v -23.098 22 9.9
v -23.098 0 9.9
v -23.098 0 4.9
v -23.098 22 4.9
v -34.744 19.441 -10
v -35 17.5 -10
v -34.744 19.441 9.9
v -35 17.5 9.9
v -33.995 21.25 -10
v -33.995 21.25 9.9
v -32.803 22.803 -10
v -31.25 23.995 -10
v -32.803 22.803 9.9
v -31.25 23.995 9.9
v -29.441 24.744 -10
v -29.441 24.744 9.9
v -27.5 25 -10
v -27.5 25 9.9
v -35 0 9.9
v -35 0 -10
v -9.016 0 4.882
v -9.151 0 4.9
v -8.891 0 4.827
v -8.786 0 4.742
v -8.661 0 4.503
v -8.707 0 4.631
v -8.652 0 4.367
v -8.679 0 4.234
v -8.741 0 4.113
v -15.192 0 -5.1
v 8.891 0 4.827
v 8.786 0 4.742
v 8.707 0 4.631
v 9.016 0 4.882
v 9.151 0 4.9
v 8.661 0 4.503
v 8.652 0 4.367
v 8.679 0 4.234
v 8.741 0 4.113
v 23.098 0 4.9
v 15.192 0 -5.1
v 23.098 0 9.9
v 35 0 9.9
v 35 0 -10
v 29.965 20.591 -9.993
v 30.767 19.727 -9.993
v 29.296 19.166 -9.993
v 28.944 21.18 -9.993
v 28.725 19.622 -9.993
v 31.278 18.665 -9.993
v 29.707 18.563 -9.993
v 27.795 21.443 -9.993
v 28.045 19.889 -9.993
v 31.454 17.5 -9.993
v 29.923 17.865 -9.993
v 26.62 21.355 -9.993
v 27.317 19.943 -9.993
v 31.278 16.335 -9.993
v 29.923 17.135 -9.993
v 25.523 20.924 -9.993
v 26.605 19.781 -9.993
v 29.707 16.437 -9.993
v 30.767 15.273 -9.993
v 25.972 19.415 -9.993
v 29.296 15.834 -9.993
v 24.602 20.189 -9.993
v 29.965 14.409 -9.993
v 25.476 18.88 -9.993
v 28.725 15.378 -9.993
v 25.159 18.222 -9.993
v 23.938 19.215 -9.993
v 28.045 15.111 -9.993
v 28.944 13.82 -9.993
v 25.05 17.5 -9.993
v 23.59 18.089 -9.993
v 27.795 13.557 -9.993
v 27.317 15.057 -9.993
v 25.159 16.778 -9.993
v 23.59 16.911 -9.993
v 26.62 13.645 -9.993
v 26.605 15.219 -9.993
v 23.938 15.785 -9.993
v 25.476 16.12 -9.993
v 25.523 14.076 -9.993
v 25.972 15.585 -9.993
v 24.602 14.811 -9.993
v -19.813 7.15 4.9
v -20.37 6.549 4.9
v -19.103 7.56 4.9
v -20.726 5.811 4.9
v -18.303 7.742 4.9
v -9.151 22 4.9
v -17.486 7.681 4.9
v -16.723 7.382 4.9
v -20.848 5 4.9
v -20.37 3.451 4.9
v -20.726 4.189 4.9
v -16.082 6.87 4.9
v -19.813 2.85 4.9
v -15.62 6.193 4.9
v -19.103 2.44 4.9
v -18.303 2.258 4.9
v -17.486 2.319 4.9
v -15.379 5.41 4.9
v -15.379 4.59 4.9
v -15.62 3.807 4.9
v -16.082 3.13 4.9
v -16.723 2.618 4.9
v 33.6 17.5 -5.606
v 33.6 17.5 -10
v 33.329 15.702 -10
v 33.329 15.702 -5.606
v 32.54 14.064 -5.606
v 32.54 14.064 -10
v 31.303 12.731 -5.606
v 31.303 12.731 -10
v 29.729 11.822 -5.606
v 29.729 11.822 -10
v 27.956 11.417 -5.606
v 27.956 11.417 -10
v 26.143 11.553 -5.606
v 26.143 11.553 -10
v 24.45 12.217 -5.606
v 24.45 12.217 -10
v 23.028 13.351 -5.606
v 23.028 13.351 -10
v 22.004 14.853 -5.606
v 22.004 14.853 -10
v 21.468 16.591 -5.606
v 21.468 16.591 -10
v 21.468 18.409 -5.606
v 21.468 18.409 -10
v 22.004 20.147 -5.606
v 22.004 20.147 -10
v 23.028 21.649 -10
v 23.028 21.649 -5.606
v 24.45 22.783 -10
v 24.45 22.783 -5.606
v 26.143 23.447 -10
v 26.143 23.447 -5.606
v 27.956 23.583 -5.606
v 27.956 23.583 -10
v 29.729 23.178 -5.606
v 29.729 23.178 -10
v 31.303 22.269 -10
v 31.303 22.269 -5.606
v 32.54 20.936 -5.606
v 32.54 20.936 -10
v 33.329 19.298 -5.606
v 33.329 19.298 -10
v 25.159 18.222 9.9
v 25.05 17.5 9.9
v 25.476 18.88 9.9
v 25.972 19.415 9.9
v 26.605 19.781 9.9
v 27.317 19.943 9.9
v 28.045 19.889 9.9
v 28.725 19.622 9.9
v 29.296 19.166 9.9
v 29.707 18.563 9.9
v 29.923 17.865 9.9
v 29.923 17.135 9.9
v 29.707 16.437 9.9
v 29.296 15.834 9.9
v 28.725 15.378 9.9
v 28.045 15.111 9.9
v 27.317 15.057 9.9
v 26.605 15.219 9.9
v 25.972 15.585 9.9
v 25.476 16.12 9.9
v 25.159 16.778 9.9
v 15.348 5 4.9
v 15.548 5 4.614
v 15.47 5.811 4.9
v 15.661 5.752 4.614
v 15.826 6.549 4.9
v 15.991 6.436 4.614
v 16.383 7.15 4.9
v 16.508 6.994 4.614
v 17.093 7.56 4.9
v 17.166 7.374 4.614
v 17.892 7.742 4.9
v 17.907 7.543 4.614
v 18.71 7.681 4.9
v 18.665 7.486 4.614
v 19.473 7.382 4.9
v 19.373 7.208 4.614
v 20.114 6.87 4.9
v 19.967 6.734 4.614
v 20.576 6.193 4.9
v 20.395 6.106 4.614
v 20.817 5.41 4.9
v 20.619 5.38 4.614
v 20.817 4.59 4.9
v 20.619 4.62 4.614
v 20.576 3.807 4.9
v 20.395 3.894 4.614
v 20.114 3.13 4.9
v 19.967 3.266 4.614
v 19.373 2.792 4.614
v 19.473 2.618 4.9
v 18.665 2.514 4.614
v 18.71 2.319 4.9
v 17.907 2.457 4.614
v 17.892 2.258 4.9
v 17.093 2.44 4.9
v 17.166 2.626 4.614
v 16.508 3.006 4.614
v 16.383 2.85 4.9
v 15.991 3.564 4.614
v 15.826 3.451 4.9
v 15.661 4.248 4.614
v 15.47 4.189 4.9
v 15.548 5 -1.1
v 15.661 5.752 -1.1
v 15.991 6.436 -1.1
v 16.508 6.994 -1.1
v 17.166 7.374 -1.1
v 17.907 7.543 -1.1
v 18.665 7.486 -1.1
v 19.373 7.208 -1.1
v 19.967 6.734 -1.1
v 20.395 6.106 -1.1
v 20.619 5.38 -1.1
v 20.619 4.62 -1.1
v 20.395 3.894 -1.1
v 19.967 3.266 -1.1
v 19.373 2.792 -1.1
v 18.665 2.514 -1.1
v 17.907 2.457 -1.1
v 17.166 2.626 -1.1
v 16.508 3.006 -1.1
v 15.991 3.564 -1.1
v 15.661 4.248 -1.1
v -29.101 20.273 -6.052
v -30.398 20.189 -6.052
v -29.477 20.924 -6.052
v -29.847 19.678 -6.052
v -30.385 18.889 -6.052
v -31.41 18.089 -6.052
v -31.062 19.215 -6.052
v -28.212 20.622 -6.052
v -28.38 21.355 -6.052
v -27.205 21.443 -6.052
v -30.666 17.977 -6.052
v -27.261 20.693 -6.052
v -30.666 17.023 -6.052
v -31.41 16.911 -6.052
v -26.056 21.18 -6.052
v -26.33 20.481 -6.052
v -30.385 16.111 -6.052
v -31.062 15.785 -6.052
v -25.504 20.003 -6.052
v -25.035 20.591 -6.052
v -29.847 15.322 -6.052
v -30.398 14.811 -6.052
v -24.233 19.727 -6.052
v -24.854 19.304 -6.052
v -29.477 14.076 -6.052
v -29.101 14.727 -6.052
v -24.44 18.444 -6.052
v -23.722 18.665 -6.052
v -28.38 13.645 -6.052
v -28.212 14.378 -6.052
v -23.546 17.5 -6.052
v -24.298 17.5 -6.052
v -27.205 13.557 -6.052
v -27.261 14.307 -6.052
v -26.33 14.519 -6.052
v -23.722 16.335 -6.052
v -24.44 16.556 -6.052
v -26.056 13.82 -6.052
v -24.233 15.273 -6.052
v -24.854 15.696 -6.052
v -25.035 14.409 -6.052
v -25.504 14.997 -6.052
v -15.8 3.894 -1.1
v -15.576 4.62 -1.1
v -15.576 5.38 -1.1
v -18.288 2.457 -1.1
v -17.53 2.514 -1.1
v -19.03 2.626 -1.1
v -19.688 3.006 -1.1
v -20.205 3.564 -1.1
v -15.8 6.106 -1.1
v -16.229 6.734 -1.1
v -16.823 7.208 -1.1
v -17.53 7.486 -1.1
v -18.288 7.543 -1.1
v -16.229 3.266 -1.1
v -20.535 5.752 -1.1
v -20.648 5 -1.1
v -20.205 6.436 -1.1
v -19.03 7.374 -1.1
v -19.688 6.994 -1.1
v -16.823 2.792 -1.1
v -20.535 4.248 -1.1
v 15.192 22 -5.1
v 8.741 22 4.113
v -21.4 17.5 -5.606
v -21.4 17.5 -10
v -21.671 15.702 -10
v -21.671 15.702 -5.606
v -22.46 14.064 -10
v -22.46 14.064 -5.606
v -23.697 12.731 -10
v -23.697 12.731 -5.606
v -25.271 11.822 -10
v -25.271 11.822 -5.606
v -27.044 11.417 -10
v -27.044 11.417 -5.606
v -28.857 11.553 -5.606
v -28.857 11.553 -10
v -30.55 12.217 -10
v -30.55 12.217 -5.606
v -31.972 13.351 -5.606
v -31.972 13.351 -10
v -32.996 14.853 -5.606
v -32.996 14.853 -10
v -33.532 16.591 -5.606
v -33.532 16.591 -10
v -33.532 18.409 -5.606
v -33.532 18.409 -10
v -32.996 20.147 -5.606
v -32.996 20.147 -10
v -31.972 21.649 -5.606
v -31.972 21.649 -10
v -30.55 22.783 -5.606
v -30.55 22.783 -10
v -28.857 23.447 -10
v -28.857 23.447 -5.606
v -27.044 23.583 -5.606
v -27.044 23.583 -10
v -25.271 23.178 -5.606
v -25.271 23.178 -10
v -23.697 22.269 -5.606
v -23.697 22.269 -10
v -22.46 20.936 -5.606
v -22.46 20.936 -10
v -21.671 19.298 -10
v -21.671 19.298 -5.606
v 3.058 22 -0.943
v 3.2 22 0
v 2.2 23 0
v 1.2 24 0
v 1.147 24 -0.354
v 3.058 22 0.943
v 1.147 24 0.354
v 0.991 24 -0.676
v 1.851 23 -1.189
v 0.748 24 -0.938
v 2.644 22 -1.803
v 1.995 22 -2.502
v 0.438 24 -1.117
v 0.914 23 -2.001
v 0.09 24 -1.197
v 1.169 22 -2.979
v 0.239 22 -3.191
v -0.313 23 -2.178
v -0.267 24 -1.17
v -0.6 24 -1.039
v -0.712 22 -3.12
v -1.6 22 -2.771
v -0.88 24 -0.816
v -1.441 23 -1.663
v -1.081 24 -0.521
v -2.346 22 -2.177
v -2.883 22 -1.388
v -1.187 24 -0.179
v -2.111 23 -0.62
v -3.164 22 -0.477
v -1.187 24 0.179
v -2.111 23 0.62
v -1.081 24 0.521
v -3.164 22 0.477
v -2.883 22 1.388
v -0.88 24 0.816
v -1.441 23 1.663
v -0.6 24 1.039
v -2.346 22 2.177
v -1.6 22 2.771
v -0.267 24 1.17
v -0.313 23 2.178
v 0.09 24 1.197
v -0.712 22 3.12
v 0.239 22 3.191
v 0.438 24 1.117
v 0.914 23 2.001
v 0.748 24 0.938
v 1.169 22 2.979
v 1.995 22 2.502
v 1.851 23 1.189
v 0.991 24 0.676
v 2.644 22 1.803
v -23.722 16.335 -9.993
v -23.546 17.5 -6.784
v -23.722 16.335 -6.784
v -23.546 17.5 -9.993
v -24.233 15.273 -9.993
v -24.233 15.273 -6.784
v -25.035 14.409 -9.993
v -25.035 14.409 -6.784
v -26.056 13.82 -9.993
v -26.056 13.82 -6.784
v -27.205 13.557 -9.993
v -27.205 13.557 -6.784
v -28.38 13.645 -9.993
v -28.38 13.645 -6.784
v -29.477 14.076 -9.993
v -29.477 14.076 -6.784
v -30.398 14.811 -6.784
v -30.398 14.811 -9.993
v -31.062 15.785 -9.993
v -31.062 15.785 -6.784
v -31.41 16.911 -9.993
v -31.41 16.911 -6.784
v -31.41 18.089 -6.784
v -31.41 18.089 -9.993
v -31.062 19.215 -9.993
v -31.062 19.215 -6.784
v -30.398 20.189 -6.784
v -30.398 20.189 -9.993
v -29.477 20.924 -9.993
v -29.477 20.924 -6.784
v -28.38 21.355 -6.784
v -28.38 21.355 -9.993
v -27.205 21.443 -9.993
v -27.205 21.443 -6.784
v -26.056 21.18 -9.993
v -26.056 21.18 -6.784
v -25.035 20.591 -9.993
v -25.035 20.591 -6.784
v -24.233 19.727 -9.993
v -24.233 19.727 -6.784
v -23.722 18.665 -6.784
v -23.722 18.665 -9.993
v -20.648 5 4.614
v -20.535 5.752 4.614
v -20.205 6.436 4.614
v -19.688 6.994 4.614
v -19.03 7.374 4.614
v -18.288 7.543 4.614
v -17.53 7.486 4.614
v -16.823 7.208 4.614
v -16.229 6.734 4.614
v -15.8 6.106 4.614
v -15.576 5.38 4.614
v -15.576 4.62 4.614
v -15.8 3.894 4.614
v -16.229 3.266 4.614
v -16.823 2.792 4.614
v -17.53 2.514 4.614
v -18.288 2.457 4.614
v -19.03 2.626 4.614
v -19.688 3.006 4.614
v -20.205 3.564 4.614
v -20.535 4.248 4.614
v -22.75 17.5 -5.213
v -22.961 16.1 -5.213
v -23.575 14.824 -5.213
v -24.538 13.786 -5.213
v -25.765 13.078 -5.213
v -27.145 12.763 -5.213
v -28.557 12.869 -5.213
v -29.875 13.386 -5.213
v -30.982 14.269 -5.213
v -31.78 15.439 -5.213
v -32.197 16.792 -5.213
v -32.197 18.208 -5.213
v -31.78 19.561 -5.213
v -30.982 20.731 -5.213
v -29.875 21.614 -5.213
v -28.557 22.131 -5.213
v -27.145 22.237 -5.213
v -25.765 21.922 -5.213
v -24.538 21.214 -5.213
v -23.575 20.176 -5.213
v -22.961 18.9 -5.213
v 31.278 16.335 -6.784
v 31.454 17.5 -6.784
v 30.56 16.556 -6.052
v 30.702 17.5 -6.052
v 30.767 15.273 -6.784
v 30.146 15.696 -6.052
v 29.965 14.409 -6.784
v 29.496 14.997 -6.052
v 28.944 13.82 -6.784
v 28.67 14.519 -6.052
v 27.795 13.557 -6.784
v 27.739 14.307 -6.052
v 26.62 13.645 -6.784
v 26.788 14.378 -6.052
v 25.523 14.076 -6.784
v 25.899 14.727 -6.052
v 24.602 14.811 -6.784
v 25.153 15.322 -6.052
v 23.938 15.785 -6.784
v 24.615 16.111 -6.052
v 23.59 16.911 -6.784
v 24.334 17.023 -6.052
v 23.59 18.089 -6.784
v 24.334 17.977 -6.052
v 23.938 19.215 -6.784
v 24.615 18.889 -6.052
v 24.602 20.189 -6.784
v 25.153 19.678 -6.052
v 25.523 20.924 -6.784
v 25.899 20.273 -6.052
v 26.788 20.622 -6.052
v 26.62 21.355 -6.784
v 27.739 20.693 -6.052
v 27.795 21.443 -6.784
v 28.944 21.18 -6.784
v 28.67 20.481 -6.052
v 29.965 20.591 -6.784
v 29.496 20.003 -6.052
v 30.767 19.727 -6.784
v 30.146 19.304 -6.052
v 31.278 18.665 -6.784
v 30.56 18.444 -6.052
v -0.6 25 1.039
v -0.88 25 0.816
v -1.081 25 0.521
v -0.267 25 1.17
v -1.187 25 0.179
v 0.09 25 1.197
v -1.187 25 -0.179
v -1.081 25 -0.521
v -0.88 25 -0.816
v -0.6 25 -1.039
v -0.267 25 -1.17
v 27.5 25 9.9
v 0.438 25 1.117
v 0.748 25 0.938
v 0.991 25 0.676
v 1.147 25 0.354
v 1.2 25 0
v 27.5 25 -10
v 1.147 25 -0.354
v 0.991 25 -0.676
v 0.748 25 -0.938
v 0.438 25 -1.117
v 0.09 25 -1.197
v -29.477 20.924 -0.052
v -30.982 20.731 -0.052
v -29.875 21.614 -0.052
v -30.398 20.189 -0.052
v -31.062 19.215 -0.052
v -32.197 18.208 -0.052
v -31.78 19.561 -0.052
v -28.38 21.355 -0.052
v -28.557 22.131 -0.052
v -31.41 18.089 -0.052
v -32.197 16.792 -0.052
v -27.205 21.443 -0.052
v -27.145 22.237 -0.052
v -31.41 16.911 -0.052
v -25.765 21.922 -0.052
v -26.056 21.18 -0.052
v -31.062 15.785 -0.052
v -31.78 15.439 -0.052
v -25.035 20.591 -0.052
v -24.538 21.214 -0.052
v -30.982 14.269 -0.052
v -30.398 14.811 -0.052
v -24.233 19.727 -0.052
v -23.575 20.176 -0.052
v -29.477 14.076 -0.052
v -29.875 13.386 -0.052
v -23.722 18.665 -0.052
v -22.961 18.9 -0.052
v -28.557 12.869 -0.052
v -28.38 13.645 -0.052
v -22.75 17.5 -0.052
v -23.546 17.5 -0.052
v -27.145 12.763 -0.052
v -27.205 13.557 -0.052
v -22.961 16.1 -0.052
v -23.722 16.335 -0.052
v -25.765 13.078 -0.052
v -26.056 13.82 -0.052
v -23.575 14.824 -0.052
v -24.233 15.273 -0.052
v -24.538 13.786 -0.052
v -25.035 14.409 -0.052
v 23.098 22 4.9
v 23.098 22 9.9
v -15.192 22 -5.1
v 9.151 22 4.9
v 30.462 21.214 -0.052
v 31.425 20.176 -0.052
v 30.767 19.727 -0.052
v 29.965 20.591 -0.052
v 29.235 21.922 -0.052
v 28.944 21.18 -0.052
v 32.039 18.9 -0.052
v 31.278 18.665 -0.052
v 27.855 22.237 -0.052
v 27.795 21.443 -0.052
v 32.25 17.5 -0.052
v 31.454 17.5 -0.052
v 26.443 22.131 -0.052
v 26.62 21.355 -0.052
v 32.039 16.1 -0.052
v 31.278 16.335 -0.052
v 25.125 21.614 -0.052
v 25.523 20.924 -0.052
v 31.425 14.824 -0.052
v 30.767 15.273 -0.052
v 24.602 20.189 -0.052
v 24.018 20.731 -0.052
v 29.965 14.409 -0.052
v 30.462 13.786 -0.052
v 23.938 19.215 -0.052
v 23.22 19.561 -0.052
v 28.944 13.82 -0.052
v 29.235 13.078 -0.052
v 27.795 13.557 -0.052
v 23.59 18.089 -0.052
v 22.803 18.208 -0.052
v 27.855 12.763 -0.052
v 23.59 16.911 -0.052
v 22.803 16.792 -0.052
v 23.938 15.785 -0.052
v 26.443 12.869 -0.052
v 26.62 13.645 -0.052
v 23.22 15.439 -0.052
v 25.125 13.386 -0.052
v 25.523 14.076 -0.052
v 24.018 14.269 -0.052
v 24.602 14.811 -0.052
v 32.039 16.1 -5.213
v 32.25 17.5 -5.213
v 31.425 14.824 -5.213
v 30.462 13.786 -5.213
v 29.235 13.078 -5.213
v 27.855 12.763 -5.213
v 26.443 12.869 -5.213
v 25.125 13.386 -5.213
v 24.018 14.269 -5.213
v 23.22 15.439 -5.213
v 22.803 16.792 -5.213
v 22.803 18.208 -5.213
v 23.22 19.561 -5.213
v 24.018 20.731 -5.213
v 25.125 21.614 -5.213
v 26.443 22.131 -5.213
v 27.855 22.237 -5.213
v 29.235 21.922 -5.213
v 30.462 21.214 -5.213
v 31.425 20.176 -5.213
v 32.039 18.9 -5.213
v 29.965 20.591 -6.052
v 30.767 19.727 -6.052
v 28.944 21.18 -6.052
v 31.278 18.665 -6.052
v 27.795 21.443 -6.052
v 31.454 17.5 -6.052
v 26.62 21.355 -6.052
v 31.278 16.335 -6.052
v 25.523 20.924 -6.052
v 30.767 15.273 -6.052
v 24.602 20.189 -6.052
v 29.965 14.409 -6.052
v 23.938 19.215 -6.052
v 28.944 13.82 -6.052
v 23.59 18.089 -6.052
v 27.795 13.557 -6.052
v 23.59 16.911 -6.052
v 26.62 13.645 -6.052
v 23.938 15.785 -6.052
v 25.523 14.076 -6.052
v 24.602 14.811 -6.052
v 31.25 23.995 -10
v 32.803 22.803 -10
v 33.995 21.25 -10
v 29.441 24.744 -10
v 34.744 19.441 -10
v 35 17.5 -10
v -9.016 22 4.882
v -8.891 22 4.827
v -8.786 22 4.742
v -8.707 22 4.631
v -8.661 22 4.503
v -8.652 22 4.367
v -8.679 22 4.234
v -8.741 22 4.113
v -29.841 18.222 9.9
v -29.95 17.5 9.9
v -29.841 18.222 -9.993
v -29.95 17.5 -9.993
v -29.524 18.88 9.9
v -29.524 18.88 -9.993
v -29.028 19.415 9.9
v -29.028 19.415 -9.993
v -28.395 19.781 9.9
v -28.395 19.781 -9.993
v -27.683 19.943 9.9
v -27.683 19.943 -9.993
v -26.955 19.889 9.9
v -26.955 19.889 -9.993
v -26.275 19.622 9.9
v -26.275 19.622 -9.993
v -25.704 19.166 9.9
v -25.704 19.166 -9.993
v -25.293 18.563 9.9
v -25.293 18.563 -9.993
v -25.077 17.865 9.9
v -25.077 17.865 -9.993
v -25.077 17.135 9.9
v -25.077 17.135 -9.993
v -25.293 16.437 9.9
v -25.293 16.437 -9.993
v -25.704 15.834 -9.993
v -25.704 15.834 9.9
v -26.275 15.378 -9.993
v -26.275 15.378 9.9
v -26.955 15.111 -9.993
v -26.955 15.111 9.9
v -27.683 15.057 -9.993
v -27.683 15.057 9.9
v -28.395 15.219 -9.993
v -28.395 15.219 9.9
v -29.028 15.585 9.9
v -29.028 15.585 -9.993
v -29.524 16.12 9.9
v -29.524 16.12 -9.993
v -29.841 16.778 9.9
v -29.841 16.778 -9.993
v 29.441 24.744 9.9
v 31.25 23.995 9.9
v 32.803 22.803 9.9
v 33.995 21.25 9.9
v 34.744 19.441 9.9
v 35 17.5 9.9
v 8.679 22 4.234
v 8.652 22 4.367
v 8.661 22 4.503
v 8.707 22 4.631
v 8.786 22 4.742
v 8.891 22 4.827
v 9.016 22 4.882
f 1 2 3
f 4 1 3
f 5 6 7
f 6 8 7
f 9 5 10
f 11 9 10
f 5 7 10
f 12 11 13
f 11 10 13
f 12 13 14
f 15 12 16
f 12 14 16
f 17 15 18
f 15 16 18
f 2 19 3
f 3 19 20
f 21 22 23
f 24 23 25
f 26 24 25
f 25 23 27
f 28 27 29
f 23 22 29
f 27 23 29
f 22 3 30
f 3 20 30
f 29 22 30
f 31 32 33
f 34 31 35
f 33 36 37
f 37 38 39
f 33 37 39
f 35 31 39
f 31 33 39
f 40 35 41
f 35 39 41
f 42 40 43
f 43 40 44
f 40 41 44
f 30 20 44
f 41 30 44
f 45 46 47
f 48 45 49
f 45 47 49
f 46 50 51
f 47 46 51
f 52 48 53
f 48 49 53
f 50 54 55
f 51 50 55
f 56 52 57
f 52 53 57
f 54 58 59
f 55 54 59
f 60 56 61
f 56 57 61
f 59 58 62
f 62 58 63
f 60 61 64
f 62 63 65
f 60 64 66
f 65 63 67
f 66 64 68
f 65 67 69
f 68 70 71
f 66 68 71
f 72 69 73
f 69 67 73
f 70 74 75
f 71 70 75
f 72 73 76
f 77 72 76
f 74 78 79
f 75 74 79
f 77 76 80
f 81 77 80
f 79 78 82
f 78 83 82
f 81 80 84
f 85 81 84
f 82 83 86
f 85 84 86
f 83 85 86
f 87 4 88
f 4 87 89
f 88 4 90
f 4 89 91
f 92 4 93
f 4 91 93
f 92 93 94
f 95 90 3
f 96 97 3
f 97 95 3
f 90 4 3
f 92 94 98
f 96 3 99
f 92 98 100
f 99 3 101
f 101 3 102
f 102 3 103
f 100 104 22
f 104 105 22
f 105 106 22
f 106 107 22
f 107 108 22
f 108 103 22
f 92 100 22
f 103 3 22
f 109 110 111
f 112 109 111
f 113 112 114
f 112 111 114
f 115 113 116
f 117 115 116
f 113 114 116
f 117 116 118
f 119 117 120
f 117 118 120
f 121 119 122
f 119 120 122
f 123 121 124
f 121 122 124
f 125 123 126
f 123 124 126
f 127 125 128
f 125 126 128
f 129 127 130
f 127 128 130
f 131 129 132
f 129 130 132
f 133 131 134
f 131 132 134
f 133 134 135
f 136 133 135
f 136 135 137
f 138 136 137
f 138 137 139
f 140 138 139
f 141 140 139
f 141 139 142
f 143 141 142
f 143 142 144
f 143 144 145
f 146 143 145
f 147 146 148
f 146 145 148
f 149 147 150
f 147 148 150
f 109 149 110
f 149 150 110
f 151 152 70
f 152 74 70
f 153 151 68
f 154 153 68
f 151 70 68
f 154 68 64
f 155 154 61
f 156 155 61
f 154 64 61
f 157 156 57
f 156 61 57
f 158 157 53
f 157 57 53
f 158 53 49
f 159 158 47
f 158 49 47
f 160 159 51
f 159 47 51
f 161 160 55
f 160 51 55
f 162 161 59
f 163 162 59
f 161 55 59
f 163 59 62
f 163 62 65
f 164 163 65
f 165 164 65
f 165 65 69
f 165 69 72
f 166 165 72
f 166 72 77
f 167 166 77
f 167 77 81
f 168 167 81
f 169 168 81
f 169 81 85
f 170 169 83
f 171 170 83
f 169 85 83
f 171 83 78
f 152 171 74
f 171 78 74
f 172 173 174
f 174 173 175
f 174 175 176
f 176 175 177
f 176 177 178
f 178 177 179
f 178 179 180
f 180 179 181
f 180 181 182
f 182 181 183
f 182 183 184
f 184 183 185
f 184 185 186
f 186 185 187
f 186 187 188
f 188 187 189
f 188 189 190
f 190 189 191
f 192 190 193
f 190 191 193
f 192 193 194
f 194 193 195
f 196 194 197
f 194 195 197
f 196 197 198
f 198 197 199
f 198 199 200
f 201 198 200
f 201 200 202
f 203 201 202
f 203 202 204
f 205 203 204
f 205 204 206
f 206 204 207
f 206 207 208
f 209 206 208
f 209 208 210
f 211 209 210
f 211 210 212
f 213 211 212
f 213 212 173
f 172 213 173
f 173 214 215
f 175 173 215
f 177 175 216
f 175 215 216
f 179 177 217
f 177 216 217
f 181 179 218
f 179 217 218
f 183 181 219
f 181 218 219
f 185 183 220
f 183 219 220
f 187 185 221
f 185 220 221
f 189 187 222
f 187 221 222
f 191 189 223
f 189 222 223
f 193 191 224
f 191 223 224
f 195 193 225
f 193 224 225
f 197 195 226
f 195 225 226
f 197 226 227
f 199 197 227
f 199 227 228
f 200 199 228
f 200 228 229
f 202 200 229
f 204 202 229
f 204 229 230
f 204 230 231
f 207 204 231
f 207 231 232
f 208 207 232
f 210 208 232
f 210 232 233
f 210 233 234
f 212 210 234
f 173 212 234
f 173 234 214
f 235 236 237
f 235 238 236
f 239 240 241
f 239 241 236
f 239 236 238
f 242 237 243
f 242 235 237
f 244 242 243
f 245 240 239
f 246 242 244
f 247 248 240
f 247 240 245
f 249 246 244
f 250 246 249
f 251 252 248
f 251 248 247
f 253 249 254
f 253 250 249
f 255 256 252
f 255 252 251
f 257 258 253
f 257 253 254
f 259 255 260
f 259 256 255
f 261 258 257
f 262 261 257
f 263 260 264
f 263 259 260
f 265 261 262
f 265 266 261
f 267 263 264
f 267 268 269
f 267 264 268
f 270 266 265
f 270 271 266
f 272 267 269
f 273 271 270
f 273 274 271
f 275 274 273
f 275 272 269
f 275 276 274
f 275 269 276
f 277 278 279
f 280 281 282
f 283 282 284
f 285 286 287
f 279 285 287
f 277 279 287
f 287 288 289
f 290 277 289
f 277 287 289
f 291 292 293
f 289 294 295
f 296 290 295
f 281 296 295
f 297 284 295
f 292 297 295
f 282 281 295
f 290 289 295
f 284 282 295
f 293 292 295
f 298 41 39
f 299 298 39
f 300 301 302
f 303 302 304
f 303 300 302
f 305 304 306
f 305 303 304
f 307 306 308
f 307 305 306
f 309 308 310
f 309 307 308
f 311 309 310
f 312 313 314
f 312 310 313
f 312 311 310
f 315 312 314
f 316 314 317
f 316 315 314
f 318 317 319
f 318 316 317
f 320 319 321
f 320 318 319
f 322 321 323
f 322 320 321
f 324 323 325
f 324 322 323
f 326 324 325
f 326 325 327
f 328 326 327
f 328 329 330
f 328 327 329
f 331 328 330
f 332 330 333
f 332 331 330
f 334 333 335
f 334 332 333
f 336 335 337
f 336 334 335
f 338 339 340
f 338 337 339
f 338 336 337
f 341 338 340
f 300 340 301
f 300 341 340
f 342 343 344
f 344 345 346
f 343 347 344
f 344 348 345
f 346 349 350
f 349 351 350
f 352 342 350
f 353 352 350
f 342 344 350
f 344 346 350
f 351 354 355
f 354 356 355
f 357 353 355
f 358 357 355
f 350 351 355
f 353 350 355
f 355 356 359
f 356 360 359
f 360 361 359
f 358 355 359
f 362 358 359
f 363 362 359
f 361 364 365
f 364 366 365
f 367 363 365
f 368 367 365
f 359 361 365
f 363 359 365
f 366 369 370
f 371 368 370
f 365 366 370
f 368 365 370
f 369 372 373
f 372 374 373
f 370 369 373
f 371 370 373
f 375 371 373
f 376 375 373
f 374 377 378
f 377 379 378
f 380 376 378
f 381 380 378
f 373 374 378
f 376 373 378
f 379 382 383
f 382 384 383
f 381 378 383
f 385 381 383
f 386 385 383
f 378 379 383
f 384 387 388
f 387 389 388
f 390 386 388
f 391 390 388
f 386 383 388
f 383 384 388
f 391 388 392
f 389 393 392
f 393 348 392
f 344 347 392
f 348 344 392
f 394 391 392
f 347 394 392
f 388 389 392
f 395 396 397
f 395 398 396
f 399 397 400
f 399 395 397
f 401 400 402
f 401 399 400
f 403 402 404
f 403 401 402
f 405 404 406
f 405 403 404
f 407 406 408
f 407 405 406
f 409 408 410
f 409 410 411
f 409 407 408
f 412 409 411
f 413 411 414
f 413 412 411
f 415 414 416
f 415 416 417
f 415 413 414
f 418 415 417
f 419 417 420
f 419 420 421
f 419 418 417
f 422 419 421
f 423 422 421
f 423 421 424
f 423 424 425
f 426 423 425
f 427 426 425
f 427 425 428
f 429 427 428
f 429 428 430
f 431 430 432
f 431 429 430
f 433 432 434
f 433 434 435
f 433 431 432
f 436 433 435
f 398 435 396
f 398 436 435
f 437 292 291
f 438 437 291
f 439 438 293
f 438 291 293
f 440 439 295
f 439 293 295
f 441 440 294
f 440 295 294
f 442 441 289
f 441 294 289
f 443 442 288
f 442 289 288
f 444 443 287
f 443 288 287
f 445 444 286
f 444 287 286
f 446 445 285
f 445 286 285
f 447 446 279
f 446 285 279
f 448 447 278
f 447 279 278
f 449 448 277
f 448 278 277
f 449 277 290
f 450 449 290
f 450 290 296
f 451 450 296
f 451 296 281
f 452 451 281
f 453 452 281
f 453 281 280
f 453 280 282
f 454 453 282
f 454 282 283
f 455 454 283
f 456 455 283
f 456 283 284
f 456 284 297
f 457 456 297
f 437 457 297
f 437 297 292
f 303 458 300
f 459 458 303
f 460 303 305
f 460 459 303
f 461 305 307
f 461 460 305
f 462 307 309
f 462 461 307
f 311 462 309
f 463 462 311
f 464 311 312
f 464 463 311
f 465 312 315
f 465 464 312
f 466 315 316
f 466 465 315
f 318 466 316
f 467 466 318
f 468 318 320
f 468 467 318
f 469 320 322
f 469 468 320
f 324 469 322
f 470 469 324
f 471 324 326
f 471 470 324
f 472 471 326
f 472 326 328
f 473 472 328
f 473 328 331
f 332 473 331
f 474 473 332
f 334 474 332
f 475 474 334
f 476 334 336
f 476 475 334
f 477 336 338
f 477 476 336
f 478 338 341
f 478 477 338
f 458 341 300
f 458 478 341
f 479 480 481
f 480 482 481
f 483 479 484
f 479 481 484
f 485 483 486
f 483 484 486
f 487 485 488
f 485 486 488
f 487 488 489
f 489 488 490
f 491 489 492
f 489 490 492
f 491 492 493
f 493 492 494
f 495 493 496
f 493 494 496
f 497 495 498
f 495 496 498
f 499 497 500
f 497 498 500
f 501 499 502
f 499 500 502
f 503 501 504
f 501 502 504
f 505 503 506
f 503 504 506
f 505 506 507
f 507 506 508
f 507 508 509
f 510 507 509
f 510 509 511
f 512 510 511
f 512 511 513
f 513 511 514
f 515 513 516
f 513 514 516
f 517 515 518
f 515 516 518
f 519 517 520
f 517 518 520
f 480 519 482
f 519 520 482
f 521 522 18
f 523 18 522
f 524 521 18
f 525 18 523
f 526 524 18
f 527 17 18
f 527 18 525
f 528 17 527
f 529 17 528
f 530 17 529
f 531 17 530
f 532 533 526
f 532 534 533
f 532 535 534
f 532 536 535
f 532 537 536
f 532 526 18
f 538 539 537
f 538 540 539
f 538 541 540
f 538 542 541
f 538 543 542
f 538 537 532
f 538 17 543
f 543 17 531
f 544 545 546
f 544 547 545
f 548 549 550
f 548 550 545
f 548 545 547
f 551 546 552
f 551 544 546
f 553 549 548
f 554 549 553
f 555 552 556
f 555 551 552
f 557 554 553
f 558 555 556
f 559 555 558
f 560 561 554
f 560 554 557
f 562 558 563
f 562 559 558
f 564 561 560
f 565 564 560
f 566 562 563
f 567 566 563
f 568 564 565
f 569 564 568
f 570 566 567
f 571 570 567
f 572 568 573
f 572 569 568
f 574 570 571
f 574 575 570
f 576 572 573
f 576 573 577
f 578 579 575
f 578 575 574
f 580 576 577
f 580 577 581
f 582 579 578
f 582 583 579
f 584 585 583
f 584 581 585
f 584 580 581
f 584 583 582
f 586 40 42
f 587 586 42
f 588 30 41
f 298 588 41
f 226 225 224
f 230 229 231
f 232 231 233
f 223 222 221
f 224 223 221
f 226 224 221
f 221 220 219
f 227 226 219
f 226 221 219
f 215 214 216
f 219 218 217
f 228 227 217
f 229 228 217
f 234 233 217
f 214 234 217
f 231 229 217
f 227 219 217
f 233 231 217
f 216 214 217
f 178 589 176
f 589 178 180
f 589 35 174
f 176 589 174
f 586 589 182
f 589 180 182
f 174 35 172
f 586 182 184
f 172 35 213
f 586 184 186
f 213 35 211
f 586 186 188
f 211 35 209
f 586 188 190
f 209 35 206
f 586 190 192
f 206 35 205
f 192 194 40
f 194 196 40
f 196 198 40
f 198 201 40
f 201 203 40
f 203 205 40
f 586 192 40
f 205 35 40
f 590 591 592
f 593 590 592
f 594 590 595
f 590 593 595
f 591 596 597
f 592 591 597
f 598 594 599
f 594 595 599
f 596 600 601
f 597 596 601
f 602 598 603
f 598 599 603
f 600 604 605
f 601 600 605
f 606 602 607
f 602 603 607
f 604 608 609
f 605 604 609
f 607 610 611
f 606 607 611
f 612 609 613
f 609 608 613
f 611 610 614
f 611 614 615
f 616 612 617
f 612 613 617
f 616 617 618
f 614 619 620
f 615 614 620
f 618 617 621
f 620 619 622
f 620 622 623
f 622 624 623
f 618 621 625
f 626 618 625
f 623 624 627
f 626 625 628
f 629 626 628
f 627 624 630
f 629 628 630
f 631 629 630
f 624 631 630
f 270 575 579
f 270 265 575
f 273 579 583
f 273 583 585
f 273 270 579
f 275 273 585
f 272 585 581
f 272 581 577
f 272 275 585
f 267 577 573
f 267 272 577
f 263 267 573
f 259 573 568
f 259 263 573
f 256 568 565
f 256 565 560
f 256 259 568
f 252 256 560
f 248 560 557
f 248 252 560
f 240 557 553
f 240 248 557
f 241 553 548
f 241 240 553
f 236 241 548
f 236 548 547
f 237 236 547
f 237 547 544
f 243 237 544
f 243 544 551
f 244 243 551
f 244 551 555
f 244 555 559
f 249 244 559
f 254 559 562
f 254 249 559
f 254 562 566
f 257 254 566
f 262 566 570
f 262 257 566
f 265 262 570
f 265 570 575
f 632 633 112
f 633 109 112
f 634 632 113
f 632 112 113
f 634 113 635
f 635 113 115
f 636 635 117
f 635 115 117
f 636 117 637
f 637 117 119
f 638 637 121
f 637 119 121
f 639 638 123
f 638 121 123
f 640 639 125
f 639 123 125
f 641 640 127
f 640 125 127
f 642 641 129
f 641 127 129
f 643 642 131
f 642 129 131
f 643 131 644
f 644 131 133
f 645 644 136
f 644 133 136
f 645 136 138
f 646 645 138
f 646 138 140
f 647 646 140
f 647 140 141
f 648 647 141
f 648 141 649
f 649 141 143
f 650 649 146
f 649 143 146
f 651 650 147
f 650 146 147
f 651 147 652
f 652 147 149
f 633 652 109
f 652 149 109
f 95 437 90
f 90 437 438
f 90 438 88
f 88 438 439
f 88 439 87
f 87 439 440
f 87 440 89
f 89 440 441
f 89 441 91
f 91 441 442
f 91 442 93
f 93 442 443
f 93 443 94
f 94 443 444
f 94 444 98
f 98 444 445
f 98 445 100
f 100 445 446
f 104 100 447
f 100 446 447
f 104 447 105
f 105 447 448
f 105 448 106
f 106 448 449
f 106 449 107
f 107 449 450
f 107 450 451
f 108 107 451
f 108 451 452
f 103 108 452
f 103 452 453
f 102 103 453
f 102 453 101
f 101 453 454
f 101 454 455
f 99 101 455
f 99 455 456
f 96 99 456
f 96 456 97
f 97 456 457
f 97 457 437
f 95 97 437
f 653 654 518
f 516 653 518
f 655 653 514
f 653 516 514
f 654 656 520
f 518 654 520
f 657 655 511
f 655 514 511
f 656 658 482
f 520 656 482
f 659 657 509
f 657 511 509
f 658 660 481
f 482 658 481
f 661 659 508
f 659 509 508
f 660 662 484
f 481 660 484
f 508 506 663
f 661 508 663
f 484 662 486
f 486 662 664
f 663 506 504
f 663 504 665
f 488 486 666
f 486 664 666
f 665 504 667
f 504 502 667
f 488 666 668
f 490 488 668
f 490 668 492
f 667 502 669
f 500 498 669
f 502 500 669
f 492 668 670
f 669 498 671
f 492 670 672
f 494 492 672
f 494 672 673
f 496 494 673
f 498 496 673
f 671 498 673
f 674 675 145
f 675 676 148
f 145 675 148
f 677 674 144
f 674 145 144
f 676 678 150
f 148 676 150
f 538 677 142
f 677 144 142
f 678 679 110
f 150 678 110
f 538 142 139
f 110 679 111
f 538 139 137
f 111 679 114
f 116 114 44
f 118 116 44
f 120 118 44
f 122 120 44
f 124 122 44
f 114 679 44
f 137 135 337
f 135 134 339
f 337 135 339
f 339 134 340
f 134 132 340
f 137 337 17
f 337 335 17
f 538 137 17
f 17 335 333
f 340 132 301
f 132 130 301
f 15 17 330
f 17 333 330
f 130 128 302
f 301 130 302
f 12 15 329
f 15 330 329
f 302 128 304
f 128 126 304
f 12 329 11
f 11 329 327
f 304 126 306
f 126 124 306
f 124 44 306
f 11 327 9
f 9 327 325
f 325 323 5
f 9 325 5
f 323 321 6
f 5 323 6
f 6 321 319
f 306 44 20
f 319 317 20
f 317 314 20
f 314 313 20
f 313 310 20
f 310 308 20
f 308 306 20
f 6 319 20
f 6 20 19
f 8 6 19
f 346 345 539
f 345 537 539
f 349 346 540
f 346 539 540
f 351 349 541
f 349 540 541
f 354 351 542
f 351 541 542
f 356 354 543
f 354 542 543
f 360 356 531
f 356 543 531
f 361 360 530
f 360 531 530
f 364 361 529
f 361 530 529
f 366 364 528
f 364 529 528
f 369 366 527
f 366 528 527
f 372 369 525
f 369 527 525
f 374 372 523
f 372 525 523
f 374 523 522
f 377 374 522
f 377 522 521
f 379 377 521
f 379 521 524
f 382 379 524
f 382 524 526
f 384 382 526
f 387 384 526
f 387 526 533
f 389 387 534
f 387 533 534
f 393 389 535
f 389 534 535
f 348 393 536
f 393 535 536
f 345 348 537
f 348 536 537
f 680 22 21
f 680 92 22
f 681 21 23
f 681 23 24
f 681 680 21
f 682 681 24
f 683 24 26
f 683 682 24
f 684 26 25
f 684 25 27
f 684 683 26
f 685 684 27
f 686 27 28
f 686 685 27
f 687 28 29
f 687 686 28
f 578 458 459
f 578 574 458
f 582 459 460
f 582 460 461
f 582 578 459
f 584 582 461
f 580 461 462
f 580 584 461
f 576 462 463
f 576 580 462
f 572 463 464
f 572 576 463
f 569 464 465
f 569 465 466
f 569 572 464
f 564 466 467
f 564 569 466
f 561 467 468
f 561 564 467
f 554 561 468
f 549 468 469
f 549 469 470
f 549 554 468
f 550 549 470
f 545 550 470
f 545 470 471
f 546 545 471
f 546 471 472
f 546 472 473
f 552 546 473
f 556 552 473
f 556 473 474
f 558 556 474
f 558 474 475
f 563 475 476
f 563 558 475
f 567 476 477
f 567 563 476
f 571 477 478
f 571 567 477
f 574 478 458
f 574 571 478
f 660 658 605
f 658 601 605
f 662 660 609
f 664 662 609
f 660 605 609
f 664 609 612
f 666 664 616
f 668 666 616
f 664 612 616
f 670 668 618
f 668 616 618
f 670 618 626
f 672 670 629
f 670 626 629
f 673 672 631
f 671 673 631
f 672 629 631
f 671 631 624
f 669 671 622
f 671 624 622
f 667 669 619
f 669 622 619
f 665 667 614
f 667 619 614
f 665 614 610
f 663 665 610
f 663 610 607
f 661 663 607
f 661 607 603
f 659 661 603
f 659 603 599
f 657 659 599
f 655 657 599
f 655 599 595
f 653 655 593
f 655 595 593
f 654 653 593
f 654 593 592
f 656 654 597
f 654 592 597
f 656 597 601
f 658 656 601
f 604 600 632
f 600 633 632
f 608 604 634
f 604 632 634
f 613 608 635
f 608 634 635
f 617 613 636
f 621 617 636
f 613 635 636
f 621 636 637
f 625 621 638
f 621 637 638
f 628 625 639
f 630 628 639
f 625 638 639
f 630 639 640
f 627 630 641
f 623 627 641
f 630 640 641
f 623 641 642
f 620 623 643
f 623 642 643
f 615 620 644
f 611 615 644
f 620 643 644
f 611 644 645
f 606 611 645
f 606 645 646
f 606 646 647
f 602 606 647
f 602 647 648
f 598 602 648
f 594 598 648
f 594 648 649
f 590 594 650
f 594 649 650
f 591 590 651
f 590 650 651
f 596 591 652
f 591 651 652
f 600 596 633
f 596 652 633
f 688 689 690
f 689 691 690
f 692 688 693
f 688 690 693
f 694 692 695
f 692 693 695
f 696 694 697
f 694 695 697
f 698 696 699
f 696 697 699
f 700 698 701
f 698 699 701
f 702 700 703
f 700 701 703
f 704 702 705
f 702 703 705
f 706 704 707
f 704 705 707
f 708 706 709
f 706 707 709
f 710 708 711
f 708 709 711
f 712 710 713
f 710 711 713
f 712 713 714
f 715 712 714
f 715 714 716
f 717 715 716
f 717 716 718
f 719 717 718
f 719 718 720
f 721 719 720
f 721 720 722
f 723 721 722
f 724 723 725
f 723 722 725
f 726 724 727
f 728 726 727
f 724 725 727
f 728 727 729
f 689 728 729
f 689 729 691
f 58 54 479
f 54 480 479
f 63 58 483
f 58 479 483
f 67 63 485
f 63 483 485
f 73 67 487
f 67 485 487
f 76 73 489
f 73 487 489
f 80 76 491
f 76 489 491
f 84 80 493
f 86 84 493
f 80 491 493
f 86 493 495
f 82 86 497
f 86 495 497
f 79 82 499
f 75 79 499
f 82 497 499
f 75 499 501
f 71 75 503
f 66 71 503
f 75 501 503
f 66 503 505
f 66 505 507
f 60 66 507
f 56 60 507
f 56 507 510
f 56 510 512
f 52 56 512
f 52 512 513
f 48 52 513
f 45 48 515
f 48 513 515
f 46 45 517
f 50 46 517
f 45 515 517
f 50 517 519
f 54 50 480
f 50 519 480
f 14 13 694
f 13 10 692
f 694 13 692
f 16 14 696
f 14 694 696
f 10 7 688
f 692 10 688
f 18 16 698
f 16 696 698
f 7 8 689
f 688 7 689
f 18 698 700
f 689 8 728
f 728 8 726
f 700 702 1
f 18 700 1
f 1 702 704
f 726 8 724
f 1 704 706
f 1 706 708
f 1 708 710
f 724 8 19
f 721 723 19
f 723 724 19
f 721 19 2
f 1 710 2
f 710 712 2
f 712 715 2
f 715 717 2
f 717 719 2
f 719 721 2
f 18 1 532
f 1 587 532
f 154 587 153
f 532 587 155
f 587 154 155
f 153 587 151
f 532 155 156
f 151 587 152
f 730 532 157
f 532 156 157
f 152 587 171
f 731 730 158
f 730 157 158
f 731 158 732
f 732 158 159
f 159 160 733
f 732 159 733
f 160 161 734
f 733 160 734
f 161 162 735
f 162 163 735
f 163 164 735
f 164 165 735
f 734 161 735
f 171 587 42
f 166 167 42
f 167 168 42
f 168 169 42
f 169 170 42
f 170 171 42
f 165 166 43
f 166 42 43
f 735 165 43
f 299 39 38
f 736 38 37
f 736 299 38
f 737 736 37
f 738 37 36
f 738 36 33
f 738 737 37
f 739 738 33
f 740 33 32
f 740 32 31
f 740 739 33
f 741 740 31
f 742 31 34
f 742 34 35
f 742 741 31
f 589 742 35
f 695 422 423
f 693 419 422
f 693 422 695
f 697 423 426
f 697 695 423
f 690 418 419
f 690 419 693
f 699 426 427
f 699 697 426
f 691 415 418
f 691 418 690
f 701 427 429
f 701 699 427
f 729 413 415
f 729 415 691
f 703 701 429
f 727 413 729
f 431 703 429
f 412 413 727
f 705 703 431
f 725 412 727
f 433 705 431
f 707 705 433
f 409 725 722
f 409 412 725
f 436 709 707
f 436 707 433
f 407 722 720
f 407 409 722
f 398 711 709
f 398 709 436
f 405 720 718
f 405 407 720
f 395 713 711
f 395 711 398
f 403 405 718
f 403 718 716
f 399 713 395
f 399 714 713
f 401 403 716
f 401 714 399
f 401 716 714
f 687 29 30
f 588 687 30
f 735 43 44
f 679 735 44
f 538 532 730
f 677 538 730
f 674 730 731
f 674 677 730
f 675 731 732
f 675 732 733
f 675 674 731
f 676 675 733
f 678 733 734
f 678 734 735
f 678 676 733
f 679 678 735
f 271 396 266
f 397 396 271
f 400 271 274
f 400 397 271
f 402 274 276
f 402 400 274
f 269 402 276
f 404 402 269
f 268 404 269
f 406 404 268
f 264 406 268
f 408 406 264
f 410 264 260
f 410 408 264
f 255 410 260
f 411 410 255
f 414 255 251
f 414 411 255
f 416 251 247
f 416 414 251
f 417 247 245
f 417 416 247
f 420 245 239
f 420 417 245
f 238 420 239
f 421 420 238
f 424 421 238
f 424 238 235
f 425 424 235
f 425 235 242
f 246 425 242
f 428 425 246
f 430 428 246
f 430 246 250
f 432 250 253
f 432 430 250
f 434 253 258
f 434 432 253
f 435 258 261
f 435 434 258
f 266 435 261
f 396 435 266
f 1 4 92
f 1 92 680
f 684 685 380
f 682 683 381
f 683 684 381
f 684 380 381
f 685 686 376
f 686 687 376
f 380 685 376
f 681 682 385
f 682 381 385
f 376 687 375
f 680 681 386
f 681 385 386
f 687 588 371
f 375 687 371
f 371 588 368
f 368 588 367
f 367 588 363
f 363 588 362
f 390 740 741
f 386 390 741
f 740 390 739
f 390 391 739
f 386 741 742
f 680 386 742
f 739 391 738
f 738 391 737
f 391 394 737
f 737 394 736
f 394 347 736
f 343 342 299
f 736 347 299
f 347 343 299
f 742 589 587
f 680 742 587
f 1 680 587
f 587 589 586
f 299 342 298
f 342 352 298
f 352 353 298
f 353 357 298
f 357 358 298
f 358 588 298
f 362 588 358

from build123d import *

# Parameters (mm, degrees)
BOSS_EXTRUDE1_DEPTH                             = 25
SKETCH2_R                                       = 2.45
CUT_EXTRUDE1_DEPTH                              = 25
FILLET1_R                                       = 7.5
SKETCH3_W                                       = 55
SKETCH3_H                                       = 19.9
BOSS_EXTRUDE2_DEPTH                             = 3
CSK_FOR_M2_FLAT_HEAD_MACHINE_SCREW1_D           = 2.4
CSK_FOR_M2_FLAT_HEAD_MACHINE_SCREW1_DEPTH       = 10
CSK_FOR_M2_FLAT_HEAD_MACHINE_SCREW1_CSINK_D     = 6.4
CSK_FOR_M2_FLAT_HEAD_MACHINE_SCREW1_CSINK_ANGLE = 90
CSK_FOR_M2_FLAT_HEAD_MACHINE_SCREW1_TIP         = 0.721032743
FILLET2_R                                       = 0.5
CSK_FOR_M5_FLAT_HEAD_MACHINE_SCREW1_D           = 5.1
CSK_FOR_M5_FLAT_HEAD_MACHINE_SCREW1_DEPTH       = 6
CSK_FOR_M5_FLAT_HEAD_MACHINE_SCREW1_CSINK_D     = 5.5
CSK_FOR_M5_FLAT_HEAD_MACHINE_SCREW1_CSINK_ANGLE = 70


with BuildPart() as part:
    # Sketch1 → Boss-Extrude1 (new body)
    with BuildSketch(Plane(origin=(0, 0, 0), x_dir=(1, 0, 0), z_dir=(0, 1, 0))):
        Polygon((-35, 10), (-35, -9.9), (-23.097924618, -9.9), (-23.097924618, -5), (-23.097924618, -4.9), (-22.997924618, -4.9), (-8.190022831, -4.9), (-15.192098213, 5.1), (15.192098213, 5.1), (8.190022831, -4.9), (22.997924618, -4.9), (23.097924618, -4.9), (23.097924618, -5), (23.097924618, -9.9), (35, -9.9), (35, 10), align=None)
    extrude(amount=BOSS_EXTRUDE1_DEPTH)

    # Sketch2 → Cut-Extrude1 (cut)
    with BuildSketch(Plane(origin=(0, 0, -10), x_dir=(-1, 0, 0), z_dir=(0, 0, -1))):
        with Locations((-27.5, 17.5)):
            Circle(SKETCH2_R)
        with Locations((27.5, 17.5)):
            Circle(SKETCH2_R)
    extrude(amount=-CUT_EXTRUDE1_DEPTH, mode=Mode.SUBTRACT)

    # Fillet1
    fillet1_edges = [part.edges().sort_by_distance(p)[0] for p in [
        (-35, 25, -0.05),
        (35, 25, -0.05),
    ]]
    fillet(fillet1_edges, radius=FILLET1_R)

    # Sketch3 → Boss-Extrude2 (add)
    with BuildSketch(Plane(origin=(0, 25, 0), x_dir=(1, 0, 0), z_dir=(0, 1, 0))):
        with Locations((0, 0.05)):
            Rectangle(SKETCH3_W, SKETCH3_H)
    extrude(amount=-BOSS_EXTRUDE2_DEPTH)

    # CSK for M2 Flat Head Machine Screw1
    with Locations(Plane(origin=(0, 22, 0), x_dir=(-1, 0, 0), z_dir=(0, -1, 0))):
        with Locations((0, 0)):
            CounterSinkHole(CSK_FOR_M2_FLAT_HEAD_MACHINE_SCREW1_D / 2, CSK_FOR_M2_FLAT_HEAD_MACHINE_SCREW1_CSINK_D / 2, depth=CSK_FOR_M2_FLAT_HEAD_MACHINE_SCREW1_DEPTH, counter_sink_angle=CSK_FOR_M2_FLAT_HEAD_MACHINE_SCREW1_CSINK_ANGLE)
            with Locations((0, 0, -(CSK_FOR_M2_FLAT_HEAD_MACHINE_SCREW1_DEPTH + CSK_FOR_M2_FLAT_HEAD_MACHINE_SCREW1_TIP / 2))):  # 118° drill point
                Cone(0, CSK_FOR_M2_FLAT_HEAD_MACHINE_SCREW1_D / 2, CSK_FOR_M2_FLAT_HEAD_MACHINE_SCREW1_TIP, mode=Mode.SUBTRACT)

    # Fillet2
    fillet2_edges = [part.edges().sort_by_distance(p)[0] for p in [
        (8.190022831, 11, 4.9),
        (-8.190022831, 11, 4.9),
    ]]
    fillet(fillet2_edges, radius=FILLET2_R)

    # Sketch10 → Cut-Revolve1 (revolve, cut)
    with BuildSketch(Plane(origin=(0, 17.5, 0), x_dir=(1, 0, 0), z_dir=(0, 1, 0))):
        Polygon((-27.5, 6.052481049), (-27.5, 10.005610284), (-33.6, 10.005610284), (-33.6, 5.605610284), (-32.25, 5.213190854), (-32.25, 0.052481049), (-31.453797848, 0.052481049), (-31.453797848, 6.052481049), (-30.701898924, 6.052481049), (-31.453797848, 6.784043238), (-31.453797848, 9.993311616), (-29.95, 9.993311616), (-29.95, 6.052481049), (-29.95, 0.052481049), (-27.5, 0.052481049), align=None)
    revolve(axis=Axis((-27.5, 17.5, 990.182204964), (0, 0, -1)), mode=Mode.SUBTRACT)

    # Sketch10<3> → Cut-Revolve2 (revolve, cut)
    with BuildSketch(Plane(origin=(0, 17.5, 0), x_dir=(1, 0, 0), z_dir=(0, 1, 0))):
        Polygon((31.453797848, 9.993311616), (31.453797848, 6.784043238), (30.701898924, 6.052481049), (31.453797848, 6.052481049), (31.453797848, 0.052481049), (32.25, 0.052481049), (32.25, 5.213190854), (33.6, 5.605610284), (33.6, 10.005610284), (27.5, 10.005610284), (27.5, 6.052481049), (27.5, 0.052481049), (29.95, 0.052481049), (29.95, 6.052481049), (29.95, 9.993311616), align=None)
    revolve(axis=Axis((27.5, 17.5, 990.028974512), (0, 0, -1)), mode=Mode.SUBTRACT)

    # CSK for M5 Flat Head Machine Screw1
    with Locations(Plane.XY.offset(4.9)):
        with Locations((-18.097924618, 5), (18.097924618, 5)):
            CounterSinkHole(CSK_FOR_M5_FLAT_HEAD_MACHINE_SCREW1_D / 2, CSK_FOR_M5_FLAT_HEAD_MACHINE_SCREW1_CSINK_D / 2, depth=CSK_FOR_M5_FLAT_HEAD_MACHINE_SCREW1_DEPTH, counter_sink_angle=CSK_FOR_M5_FLAT_HEAD_MACHINE_SCREW1_CSINK_ANGLE)


solid = part.part
